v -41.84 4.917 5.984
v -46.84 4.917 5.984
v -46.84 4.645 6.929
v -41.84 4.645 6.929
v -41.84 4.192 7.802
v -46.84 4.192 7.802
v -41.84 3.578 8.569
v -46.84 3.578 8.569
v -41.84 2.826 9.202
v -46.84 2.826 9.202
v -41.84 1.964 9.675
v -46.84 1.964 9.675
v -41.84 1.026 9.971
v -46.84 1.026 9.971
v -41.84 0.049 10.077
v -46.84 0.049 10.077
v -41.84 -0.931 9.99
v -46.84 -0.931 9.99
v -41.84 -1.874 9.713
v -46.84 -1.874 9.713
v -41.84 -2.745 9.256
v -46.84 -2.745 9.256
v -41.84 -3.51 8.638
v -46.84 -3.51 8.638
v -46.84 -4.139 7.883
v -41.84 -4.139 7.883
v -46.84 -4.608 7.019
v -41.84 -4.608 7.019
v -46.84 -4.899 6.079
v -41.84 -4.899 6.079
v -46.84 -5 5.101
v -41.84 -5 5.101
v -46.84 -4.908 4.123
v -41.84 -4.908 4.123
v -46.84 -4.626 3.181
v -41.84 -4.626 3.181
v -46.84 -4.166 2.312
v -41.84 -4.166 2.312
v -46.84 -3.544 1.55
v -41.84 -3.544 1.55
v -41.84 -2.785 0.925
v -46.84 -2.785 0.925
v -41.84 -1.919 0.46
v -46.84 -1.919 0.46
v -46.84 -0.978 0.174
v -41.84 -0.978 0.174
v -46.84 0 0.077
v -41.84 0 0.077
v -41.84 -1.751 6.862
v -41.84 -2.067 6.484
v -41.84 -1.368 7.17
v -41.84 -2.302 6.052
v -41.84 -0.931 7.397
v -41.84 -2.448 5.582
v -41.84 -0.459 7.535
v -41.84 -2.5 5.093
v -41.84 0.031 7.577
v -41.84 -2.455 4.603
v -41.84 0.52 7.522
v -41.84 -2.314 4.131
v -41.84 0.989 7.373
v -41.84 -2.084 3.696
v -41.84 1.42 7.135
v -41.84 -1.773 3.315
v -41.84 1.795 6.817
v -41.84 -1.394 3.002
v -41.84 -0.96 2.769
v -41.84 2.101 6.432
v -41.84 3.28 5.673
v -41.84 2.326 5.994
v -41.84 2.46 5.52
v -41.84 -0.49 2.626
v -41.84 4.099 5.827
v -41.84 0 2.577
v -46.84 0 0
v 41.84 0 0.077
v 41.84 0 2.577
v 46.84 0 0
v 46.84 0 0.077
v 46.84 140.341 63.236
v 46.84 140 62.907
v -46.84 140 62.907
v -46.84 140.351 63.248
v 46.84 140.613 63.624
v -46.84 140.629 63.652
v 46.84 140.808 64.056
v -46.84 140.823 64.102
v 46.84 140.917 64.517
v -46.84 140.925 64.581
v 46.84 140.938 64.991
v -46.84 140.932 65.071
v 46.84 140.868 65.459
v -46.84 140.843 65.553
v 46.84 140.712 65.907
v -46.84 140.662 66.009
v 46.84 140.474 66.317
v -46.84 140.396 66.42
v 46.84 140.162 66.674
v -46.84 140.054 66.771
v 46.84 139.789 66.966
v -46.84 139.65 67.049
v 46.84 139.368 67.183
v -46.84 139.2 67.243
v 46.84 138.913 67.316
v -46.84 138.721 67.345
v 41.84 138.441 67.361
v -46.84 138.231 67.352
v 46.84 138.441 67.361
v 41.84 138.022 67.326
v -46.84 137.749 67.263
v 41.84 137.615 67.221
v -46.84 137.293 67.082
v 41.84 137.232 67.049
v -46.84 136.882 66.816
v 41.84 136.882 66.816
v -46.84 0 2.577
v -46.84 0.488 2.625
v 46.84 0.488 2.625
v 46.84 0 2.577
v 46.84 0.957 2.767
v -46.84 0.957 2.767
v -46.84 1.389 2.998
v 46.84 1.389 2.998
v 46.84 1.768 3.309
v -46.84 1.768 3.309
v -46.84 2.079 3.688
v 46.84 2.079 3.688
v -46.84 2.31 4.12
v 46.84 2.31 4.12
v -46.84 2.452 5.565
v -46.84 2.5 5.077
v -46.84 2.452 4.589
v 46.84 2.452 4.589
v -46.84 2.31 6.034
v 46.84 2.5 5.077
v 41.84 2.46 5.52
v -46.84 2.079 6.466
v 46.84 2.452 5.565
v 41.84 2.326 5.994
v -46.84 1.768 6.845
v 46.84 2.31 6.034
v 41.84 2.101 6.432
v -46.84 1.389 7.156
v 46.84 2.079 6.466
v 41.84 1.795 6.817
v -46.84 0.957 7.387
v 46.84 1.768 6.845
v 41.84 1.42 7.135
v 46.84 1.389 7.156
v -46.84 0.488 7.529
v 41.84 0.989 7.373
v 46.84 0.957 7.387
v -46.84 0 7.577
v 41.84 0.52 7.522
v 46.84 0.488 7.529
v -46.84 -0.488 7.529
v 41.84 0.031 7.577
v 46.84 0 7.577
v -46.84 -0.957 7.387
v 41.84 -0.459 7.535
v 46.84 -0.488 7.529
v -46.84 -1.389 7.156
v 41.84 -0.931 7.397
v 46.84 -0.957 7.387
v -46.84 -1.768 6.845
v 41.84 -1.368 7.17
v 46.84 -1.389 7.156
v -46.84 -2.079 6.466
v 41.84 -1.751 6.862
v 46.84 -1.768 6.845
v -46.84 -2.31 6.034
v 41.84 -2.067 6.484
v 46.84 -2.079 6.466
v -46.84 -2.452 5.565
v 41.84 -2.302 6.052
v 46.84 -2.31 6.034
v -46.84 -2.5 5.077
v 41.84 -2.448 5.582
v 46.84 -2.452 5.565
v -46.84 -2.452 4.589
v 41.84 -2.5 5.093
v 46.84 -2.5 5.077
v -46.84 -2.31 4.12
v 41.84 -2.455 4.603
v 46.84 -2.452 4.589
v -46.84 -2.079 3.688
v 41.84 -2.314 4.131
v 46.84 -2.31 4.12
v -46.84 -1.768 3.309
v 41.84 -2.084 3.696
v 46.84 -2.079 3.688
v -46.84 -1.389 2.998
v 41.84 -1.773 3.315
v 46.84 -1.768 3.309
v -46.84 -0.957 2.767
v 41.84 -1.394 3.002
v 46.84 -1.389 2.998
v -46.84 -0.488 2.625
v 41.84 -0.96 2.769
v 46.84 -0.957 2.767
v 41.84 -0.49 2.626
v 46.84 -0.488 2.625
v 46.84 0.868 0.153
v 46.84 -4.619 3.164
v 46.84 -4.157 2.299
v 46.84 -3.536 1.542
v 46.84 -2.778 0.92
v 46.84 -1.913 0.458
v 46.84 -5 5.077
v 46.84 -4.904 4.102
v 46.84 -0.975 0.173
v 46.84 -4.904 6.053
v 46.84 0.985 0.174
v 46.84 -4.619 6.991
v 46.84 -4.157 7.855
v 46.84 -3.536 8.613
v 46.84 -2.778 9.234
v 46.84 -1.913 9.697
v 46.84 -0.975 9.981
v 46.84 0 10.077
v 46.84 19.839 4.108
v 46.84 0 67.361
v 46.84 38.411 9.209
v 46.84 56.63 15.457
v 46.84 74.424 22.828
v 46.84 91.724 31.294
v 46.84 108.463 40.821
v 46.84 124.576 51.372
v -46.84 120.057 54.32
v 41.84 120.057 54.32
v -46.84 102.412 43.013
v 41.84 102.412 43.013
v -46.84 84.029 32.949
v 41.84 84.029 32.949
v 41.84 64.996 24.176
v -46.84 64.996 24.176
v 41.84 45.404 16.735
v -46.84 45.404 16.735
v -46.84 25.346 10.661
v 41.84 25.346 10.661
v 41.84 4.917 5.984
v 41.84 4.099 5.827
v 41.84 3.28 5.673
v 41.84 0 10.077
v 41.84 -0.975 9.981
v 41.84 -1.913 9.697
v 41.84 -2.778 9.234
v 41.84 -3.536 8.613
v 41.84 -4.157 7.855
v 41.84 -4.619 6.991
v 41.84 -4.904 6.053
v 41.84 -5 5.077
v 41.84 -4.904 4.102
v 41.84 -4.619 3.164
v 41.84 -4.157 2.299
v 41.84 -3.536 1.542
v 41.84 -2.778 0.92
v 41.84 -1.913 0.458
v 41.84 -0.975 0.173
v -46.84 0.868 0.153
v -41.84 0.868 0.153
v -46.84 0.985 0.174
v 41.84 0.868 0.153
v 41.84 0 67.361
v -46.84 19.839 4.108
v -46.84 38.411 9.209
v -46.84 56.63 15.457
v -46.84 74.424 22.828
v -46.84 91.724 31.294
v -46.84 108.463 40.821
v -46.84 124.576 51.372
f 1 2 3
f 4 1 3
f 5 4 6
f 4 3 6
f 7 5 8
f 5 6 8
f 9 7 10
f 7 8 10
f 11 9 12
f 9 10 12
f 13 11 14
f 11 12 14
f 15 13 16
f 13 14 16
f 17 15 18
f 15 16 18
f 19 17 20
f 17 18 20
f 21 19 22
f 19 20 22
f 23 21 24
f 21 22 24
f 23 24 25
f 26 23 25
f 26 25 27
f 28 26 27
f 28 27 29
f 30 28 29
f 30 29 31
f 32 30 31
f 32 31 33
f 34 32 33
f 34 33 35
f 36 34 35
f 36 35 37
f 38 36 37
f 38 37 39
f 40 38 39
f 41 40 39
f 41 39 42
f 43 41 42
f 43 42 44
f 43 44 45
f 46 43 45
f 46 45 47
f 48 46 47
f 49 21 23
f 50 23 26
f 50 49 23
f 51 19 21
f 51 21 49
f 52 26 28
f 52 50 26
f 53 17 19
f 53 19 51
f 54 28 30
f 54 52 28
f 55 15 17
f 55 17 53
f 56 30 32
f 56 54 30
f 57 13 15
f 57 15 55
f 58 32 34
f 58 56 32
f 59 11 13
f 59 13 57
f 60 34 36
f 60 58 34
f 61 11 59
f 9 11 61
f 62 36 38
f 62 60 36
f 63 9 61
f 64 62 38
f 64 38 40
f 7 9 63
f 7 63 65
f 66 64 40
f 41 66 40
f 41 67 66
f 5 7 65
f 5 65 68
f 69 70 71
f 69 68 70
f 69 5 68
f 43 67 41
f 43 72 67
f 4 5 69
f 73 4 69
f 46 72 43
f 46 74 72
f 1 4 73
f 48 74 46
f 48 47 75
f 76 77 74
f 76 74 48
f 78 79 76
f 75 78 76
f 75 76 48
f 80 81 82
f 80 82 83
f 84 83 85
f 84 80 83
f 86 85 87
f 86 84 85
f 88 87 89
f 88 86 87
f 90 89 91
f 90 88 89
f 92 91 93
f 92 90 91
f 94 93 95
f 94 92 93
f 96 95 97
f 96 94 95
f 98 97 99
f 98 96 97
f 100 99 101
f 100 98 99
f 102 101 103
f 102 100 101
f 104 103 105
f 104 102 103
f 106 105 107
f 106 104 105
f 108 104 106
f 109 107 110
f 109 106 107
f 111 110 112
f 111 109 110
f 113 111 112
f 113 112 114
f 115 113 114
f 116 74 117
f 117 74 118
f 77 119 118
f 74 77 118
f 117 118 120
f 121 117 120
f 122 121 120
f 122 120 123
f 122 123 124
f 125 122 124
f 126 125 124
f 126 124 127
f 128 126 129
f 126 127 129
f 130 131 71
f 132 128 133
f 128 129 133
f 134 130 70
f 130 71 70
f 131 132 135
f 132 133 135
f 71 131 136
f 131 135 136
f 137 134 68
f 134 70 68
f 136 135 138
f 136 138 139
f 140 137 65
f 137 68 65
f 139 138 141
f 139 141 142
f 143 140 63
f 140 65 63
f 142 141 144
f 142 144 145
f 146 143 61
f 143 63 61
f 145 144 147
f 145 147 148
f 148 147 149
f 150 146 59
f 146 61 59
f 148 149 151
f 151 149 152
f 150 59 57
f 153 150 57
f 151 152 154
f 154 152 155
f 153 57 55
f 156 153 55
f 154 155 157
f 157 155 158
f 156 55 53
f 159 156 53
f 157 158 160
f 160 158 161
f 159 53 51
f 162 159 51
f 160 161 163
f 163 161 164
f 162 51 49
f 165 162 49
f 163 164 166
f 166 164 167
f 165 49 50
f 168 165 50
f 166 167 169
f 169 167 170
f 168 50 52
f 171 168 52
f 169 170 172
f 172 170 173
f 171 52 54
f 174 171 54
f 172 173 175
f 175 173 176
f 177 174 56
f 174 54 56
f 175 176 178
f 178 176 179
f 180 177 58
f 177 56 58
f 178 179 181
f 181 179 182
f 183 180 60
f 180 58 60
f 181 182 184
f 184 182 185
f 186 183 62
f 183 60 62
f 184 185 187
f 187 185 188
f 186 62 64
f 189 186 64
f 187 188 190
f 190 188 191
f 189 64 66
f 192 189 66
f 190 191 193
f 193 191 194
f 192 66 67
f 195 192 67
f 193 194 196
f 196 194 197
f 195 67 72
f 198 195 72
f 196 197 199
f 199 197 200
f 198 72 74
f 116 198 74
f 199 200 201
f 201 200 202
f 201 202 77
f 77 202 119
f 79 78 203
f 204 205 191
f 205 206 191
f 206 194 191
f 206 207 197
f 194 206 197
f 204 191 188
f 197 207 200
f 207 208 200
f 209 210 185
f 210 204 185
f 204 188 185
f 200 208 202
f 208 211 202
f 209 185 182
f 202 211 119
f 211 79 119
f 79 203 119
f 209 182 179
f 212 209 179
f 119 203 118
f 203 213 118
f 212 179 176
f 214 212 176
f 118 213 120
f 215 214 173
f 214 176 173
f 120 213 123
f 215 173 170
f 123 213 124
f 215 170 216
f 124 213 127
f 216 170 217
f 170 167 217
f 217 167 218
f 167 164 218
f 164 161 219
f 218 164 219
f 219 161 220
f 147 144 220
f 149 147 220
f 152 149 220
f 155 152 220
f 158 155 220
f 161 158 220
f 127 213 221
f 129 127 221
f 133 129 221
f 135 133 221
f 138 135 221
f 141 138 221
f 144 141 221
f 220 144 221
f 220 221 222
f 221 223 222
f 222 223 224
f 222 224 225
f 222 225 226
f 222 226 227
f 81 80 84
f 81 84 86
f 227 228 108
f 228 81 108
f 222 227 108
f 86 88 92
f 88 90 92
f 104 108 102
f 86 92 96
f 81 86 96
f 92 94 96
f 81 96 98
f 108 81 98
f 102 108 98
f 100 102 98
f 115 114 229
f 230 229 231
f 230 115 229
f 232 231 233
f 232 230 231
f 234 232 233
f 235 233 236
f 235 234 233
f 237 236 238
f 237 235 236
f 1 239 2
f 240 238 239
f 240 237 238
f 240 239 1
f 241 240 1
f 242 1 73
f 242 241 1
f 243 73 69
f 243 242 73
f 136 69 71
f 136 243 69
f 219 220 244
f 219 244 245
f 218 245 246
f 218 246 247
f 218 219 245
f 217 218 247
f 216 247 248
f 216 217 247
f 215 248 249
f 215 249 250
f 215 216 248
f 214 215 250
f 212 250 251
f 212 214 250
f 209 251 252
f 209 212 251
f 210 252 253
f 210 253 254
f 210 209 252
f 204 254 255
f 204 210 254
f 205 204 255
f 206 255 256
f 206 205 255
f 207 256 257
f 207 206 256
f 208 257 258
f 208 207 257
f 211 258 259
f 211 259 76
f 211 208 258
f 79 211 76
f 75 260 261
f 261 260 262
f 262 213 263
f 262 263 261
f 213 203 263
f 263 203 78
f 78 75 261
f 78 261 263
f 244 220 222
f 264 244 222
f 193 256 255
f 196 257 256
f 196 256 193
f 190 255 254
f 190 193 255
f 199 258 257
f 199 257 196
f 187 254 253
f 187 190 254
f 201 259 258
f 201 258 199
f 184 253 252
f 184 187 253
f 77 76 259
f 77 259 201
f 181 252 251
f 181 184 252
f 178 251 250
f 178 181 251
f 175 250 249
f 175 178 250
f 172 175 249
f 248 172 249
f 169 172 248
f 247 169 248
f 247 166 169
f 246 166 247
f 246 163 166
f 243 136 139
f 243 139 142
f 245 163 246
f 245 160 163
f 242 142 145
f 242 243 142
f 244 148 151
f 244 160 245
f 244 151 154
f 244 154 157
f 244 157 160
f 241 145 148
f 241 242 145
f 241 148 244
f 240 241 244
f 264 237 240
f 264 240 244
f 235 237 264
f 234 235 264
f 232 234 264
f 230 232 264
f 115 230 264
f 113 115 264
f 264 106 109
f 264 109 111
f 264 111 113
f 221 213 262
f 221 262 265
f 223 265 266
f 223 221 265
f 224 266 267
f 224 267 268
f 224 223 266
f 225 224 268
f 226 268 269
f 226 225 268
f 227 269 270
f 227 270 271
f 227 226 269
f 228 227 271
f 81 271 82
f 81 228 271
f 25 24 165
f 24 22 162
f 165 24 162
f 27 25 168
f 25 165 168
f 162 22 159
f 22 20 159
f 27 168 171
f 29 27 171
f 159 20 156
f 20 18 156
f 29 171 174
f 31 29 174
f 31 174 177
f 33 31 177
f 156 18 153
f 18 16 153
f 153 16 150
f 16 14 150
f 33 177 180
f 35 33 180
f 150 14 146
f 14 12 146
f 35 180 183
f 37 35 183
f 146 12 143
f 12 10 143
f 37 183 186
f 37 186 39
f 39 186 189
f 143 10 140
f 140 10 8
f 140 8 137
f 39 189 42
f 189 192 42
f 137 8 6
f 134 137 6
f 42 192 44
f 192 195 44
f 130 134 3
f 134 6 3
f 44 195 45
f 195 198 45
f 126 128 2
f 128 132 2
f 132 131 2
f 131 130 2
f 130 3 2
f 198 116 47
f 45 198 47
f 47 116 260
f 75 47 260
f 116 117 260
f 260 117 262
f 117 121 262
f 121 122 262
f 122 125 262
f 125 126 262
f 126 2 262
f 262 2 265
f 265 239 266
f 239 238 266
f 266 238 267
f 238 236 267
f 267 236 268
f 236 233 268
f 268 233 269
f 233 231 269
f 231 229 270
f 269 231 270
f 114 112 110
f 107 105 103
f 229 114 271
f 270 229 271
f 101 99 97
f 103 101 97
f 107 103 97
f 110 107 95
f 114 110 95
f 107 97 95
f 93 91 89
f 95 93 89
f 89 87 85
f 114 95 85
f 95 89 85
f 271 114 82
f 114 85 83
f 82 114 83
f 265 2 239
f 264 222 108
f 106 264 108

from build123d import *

# Parameters (mm, degrees)
BOSS_EXTRUDE8_DEPTH  = 46.84
SKETCH10_R           = 5
BOSS_EXTRUDE9_DEPTH  = 5
SKETCH11_R           = 2.5
CUT_EXTRUDE4_DEPTH   = 94.68
BOSS_EXTRUDE10_DEPTH = 5


with BuildPart() as part:
    # Sketch9 → Boss-Extrude8 (new body, symmetric)
    with BuildSketch(Plane(origin=(0, 0, 0), x_dir=(0, 0, -1), z_dir=(1, 0, 0))):
        with BuildLine():
            Line((0, 0), (-0.173648178, 0.984807753))
            ThreePointArc((-0.173648178, 0.984807753), (-22.828245747, 74.423796966), (-62.906637971, 140))
            ThreePointArc((-62.906637971, 140), (-66.419974037, 140.395562491), (-66.815536529, 136.882226425))
            ThreePointArc((-66.815536529, 136.882226425), (-27.385689632, 72.367172247), (-5.097686943, 0.116566865))
            Line((-5.097686943, 0.116566865), (-5.077133059, 0))
            Line((-5.077133059, 0), (0, 0))
        make_face()
    extrude(amount=BOSS_EXTRUDE8_DEPTH, both=True)

    # Sketch10 → Boss-Extrude9 (add)
    with BuildSketch(Plane(origin=(46.84, 0, 0), x_dir=(0, 0, -1), z_dir=(1, 0, 0))):
        with Locations((-5.077133059, 0)):
            Circle(SKETCH10_R)
    boss_extrude9 = extrude(amount=-BOSS_EXTRUDE9_DEPTH)

    # Mirror1: Boss-Extrude9 across plane
    add(boss_extrude9.mirror(Plane(origin=(0, 0, 0), x_dir=(0, 0, 1), z_dir=(1, 0, 0))))

    # Sketch11 → Cut-Extrude4 (cut, through all)
    with BuildSketch(Plane(origin=(46.84, 0, 0), x_dir=(0, 0, -1), z_dir=(1, 0, 0))):
        with Locations((-5.077133059, 0)):
            Circle(SKETCH11_R)
    extrude(amount=-CUT_EXTRUDE4_DEPTH, mode=Mode.SUBTRACT)

    # Sketch13 → Boss-Extrude10 (add)
    with BuildSketch(Plane(origin=(46.84, 0, 0), x_dir=(0, 0, -1), z_dir=(1, 0, 0))):
        with BuildLine():
            Line((-10.077133059, 0), (-67.36108725, 0))
            Line((-67.36108725, 0), (-67.36108725, 138.441113213))
            ThreePointArc((-67.36108725, 138.441113213), (-67.220761295, 137.615317595), (-66.815536529, 136.882226425))
            ThreePointArc((-66.815536529, 136.882226425), (-28.39859142, 74.587920976), (-5.983948215, 4.917081072))
            ThreePointArc((-5.983948215, 4.917081072), (-8.919923438, 3.198900141), (-10.077133059, 0))
        make_face()
    extrude(amount=-BOSS_EXTRUDE10_DEPTH)


solid = part.part
